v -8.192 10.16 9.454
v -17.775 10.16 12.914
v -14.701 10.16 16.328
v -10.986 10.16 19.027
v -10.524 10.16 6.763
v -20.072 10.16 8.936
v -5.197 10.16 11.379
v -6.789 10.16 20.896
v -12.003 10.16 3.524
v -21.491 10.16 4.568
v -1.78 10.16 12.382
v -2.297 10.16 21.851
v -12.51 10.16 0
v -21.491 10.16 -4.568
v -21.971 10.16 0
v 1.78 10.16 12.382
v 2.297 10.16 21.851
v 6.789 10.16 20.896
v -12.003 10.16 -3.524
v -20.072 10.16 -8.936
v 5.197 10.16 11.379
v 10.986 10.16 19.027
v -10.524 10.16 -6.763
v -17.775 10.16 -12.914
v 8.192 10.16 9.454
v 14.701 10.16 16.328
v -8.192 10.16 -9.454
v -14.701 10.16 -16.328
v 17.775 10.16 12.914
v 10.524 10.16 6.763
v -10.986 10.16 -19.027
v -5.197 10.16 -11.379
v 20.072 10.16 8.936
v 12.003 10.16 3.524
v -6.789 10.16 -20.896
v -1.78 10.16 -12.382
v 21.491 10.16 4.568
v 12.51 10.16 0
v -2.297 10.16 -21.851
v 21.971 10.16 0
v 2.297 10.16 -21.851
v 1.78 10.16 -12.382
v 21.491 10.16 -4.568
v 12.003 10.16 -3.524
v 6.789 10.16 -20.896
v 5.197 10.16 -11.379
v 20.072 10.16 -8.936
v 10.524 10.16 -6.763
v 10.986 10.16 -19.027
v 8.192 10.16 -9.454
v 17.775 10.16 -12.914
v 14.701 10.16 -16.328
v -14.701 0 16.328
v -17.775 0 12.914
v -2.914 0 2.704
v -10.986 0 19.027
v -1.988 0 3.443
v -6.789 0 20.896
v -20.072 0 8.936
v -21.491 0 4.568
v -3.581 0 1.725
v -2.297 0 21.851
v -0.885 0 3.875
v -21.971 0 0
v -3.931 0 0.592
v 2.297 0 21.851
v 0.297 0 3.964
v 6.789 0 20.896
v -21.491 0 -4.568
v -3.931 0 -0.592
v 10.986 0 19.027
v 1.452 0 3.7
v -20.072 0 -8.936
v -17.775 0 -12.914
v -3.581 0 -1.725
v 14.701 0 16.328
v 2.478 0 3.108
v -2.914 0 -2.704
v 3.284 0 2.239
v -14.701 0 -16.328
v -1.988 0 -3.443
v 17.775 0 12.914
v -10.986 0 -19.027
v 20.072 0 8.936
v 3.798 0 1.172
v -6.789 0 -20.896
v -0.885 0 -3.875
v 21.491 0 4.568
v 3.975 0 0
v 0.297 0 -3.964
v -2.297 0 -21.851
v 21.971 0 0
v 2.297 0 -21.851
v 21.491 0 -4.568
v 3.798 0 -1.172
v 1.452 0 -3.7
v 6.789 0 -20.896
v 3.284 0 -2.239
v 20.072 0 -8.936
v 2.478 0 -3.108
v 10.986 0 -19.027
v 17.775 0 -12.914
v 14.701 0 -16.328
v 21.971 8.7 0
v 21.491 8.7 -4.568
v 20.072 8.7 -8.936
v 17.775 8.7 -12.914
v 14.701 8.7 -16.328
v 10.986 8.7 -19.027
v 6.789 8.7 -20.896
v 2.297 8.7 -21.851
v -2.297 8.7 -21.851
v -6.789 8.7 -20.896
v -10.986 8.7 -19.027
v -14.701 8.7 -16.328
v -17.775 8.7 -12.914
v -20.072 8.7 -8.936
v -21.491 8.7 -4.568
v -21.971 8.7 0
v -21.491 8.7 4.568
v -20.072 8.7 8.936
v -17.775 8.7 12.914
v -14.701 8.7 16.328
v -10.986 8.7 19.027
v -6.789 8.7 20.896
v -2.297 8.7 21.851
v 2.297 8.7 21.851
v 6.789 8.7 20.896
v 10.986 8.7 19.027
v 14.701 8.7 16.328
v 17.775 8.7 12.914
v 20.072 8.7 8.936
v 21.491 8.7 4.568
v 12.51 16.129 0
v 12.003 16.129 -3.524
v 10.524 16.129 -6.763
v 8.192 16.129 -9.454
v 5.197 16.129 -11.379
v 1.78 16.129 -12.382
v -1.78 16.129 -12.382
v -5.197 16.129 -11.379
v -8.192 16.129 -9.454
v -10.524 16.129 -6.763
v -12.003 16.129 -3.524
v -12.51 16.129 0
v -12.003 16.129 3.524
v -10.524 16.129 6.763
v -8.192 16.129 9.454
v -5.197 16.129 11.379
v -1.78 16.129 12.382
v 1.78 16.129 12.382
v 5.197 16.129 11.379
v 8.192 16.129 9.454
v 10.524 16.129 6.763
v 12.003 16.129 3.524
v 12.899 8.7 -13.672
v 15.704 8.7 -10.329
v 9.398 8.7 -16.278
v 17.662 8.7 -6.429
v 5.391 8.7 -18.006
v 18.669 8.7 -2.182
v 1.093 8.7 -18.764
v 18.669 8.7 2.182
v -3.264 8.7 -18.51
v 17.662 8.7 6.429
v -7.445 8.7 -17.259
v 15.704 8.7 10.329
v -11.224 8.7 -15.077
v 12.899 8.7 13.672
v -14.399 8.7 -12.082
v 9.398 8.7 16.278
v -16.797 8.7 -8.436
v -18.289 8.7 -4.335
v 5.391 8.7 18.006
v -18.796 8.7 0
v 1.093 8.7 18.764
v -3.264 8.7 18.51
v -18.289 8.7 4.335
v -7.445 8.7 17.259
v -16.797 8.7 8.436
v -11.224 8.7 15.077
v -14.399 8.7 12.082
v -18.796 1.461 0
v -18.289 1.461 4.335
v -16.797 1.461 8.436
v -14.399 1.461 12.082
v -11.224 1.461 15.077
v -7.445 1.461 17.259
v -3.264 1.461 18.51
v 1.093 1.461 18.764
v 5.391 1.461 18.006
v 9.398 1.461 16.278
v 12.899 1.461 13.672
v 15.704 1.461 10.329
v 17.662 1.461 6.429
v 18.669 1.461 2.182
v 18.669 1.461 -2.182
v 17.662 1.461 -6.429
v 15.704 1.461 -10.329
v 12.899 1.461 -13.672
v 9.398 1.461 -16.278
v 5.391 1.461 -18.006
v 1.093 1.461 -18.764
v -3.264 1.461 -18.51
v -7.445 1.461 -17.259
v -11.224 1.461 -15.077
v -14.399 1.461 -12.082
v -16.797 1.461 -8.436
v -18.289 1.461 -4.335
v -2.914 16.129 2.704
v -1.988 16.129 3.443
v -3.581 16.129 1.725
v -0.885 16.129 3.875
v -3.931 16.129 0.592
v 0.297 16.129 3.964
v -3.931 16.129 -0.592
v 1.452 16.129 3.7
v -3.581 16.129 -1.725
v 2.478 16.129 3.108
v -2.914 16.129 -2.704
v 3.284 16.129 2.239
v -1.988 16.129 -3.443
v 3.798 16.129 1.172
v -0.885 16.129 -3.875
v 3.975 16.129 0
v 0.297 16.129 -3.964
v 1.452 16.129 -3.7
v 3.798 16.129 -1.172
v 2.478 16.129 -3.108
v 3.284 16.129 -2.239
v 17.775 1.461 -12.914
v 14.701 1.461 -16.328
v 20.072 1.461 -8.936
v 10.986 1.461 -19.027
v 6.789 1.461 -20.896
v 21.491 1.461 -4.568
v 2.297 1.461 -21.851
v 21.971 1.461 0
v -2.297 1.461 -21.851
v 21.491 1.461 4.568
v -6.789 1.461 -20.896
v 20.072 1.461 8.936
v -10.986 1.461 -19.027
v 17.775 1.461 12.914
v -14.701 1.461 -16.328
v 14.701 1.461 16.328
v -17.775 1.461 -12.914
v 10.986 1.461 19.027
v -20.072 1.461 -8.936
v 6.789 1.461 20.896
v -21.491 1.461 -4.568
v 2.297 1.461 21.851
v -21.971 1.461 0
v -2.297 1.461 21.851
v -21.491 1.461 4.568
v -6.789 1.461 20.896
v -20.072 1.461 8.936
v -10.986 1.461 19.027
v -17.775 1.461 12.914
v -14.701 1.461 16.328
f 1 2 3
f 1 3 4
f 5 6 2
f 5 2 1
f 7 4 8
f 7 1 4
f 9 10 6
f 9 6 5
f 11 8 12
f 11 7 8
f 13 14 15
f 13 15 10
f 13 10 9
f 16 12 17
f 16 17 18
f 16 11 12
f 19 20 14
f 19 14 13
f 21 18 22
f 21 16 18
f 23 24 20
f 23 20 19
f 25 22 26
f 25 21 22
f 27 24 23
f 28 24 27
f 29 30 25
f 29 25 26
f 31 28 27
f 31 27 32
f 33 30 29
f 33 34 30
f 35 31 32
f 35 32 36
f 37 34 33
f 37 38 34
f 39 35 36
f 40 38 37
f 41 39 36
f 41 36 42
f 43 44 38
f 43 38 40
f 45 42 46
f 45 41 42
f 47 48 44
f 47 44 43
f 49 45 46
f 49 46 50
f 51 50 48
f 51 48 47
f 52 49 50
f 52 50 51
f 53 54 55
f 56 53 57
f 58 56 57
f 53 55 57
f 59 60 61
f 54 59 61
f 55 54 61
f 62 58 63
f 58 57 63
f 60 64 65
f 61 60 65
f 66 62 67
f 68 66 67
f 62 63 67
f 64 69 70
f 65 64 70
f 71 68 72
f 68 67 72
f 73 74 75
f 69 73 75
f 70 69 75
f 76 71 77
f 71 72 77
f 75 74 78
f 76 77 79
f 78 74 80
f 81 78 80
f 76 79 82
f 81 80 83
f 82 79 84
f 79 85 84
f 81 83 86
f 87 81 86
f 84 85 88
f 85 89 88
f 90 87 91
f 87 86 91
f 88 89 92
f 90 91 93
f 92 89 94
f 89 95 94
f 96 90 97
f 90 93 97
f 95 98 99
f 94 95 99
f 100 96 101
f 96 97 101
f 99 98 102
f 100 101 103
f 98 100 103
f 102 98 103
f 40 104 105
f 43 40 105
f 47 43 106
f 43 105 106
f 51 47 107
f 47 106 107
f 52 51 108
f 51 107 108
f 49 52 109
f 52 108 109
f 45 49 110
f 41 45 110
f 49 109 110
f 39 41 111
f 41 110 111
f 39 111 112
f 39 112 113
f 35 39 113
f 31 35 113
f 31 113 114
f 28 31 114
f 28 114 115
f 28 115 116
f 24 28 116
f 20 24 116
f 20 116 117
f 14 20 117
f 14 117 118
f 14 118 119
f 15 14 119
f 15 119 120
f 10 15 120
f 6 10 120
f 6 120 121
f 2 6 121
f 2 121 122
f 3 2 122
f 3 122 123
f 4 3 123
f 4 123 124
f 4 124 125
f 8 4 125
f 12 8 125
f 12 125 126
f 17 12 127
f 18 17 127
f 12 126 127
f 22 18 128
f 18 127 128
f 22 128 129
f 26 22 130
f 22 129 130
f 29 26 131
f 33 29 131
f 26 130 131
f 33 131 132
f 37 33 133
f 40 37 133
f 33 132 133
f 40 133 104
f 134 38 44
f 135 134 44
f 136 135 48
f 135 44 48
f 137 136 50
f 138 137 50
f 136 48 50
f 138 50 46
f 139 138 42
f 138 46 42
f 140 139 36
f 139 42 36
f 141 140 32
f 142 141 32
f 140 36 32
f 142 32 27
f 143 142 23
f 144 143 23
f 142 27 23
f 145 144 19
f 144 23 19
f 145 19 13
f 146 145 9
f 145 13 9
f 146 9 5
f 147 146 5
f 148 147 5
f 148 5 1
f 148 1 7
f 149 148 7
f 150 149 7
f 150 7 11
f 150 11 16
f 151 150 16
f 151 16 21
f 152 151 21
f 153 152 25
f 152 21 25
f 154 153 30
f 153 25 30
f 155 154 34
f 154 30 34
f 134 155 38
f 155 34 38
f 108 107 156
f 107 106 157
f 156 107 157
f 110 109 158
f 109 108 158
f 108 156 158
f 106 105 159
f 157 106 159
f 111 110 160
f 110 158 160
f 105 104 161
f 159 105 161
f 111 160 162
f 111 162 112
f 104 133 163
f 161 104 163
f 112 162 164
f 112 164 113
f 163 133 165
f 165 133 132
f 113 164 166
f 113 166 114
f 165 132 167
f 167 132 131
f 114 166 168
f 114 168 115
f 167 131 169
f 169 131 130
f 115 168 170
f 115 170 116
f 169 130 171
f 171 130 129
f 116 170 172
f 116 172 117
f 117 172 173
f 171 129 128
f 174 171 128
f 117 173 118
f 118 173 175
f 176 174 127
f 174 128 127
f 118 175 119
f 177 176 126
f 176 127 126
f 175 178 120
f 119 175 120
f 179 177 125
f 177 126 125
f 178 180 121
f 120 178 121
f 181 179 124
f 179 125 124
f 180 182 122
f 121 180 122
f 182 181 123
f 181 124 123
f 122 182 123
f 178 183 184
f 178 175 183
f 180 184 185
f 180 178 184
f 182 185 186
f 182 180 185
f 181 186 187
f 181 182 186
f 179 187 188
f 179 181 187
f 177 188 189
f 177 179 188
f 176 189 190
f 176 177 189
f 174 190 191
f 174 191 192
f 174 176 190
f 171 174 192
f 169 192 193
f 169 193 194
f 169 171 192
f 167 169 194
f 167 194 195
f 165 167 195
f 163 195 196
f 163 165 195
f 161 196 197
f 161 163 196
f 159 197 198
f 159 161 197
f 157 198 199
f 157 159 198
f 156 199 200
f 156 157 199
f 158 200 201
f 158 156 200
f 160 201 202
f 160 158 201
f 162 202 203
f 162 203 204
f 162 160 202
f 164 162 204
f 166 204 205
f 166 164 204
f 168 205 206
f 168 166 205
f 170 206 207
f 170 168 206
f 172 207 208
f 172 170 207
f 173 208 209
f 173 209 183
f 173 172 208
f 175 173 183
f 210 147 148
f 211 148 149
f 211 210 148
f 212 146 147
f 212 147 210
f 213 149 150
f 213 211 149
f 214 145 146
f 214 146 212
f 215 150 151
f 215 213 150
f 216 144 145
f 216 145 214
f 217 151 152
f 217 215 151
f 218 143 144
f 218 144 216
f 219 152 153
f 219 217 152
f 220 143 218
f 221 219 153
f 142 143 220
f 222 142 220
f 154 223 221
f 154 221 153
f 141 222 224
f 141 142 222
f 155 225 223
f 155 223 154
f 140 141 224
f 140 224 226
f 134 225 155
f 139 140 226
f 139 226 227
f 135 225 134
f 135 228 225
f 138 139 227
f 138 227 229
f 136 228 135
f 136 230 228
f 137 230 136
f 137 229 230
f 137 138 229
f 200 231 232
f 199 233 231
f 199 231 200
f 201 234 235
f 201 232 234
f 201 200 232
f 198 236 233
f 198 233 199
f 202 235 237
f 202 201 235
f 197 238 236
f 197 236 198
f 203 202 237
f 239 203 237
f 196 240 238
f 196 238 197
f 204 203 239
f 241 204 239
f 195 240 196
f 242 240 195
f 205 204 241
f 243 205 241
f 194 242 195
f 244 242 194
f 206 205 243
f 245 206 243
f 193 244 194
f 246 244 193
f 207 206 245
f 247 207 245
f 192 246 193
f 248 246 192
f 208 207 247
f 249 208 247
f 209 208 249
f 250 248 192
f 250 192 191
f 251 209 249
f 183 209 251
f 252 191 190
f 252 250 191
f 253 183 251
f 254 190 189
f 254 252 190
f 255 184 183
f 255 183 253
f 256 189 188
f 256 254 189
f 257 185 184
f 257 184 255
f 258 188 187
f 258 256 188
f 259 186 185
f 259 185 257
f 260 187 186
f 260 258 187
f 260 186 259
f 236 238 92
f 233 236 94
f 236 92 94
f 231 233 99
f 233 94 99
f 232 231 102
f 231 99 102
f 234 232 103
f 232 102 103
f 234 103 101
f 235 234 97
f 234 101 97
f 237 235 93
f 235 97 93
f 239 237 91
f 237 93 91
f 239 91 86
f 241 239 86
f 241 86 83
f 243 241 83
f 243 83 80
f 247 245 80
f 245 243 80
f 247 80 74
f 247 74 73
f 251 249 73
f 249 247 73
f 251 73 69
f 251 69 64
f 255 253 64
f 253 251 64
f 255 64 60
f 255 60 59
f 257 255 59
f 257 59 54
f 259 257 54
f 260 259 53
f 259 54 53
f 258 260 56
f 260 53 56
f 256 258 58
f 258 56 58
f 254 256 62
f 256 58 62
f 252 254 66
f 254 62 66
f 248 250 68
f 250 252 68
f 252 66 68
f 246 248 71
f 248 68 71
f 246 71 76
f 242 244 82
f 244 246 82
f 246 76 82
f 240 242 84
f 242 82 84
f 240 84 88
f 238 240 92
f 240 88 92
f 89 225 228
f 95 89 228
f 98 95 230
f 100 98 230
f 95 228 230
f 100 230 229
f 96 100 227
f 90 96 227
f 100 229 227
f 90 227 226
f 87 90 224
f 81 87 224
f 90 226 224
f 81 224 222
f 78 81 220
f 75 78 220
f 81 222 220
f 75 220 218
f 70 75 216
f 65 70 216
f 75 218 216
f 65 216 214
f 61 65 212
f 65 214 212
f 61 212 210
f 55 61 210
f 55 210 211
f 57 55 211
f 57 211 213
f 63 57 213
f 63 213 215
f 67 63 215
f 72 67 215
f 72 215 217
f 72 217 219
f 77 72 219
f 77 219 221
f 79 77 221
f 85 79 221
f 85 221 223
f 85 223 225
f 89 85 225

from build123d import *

# Parameters (mm, degrees)
SKETCH1_R           = 21.971
BOSS_EXTRUDE1_DEPTH = 10.16
SKETCH2_W           = 3.175
SKETCH2_H           = 7.239
SKETCH3_R           = 12.5095
BOSS_EXTRUDE2_DEPTH = 5.969
SKETCH4_R           = 3.9751
CUT_EXTRUDE1_DEPTH  = 17.129


with BuildPart() as part:
    # Sketch1 → Boss-Extrude1 (new body)
    with BuildSketch(Plane(origin=(0, 0, 0), x_dir=(1, 0, 0), z_dir=(0, 1, 0))):
        Circle(SKETCH1_R)
    extrude(amount=BOSS_EXTRUDE1_DEPTH)

    # Sketch2 → Cut-Revolve1 (revolve, cut)
    with BuildSketch(Plane.XY):
        with Locations((-20.3835, 5.08)):
            Rectangle(SKETCH2_W, SKETCH2_H)
    revolve(axis=Axis((0, 0, 0), (0, 1, 0)), mode=Mode.SUBTRACT)

    # Sketch3 → Boss-Extrude2 (add)
    with BuildSketch(Plane(origin=(0, 10.16, 0), x_dir=(1, 0, 0), z_dir=(0, 1, 0))):
        Circle(SKETCH3_R)
    extrude(amount=BOSS_EXTRUDE2_DEPTH)

    # Sketch4 → Cut-Extrude1 (cut, through all)
    with BuildSketch(Plane(origin=(0, 16.129, 0), x_dir=(1, 0, 0), z_dir=(0, 1, 0))):
        Circle(SKETCH4_R)
    extrude(amount=-CUT_EXTRUDE1_DEPTH, mode=Mode.SUBTRACT)


solid = part.part
